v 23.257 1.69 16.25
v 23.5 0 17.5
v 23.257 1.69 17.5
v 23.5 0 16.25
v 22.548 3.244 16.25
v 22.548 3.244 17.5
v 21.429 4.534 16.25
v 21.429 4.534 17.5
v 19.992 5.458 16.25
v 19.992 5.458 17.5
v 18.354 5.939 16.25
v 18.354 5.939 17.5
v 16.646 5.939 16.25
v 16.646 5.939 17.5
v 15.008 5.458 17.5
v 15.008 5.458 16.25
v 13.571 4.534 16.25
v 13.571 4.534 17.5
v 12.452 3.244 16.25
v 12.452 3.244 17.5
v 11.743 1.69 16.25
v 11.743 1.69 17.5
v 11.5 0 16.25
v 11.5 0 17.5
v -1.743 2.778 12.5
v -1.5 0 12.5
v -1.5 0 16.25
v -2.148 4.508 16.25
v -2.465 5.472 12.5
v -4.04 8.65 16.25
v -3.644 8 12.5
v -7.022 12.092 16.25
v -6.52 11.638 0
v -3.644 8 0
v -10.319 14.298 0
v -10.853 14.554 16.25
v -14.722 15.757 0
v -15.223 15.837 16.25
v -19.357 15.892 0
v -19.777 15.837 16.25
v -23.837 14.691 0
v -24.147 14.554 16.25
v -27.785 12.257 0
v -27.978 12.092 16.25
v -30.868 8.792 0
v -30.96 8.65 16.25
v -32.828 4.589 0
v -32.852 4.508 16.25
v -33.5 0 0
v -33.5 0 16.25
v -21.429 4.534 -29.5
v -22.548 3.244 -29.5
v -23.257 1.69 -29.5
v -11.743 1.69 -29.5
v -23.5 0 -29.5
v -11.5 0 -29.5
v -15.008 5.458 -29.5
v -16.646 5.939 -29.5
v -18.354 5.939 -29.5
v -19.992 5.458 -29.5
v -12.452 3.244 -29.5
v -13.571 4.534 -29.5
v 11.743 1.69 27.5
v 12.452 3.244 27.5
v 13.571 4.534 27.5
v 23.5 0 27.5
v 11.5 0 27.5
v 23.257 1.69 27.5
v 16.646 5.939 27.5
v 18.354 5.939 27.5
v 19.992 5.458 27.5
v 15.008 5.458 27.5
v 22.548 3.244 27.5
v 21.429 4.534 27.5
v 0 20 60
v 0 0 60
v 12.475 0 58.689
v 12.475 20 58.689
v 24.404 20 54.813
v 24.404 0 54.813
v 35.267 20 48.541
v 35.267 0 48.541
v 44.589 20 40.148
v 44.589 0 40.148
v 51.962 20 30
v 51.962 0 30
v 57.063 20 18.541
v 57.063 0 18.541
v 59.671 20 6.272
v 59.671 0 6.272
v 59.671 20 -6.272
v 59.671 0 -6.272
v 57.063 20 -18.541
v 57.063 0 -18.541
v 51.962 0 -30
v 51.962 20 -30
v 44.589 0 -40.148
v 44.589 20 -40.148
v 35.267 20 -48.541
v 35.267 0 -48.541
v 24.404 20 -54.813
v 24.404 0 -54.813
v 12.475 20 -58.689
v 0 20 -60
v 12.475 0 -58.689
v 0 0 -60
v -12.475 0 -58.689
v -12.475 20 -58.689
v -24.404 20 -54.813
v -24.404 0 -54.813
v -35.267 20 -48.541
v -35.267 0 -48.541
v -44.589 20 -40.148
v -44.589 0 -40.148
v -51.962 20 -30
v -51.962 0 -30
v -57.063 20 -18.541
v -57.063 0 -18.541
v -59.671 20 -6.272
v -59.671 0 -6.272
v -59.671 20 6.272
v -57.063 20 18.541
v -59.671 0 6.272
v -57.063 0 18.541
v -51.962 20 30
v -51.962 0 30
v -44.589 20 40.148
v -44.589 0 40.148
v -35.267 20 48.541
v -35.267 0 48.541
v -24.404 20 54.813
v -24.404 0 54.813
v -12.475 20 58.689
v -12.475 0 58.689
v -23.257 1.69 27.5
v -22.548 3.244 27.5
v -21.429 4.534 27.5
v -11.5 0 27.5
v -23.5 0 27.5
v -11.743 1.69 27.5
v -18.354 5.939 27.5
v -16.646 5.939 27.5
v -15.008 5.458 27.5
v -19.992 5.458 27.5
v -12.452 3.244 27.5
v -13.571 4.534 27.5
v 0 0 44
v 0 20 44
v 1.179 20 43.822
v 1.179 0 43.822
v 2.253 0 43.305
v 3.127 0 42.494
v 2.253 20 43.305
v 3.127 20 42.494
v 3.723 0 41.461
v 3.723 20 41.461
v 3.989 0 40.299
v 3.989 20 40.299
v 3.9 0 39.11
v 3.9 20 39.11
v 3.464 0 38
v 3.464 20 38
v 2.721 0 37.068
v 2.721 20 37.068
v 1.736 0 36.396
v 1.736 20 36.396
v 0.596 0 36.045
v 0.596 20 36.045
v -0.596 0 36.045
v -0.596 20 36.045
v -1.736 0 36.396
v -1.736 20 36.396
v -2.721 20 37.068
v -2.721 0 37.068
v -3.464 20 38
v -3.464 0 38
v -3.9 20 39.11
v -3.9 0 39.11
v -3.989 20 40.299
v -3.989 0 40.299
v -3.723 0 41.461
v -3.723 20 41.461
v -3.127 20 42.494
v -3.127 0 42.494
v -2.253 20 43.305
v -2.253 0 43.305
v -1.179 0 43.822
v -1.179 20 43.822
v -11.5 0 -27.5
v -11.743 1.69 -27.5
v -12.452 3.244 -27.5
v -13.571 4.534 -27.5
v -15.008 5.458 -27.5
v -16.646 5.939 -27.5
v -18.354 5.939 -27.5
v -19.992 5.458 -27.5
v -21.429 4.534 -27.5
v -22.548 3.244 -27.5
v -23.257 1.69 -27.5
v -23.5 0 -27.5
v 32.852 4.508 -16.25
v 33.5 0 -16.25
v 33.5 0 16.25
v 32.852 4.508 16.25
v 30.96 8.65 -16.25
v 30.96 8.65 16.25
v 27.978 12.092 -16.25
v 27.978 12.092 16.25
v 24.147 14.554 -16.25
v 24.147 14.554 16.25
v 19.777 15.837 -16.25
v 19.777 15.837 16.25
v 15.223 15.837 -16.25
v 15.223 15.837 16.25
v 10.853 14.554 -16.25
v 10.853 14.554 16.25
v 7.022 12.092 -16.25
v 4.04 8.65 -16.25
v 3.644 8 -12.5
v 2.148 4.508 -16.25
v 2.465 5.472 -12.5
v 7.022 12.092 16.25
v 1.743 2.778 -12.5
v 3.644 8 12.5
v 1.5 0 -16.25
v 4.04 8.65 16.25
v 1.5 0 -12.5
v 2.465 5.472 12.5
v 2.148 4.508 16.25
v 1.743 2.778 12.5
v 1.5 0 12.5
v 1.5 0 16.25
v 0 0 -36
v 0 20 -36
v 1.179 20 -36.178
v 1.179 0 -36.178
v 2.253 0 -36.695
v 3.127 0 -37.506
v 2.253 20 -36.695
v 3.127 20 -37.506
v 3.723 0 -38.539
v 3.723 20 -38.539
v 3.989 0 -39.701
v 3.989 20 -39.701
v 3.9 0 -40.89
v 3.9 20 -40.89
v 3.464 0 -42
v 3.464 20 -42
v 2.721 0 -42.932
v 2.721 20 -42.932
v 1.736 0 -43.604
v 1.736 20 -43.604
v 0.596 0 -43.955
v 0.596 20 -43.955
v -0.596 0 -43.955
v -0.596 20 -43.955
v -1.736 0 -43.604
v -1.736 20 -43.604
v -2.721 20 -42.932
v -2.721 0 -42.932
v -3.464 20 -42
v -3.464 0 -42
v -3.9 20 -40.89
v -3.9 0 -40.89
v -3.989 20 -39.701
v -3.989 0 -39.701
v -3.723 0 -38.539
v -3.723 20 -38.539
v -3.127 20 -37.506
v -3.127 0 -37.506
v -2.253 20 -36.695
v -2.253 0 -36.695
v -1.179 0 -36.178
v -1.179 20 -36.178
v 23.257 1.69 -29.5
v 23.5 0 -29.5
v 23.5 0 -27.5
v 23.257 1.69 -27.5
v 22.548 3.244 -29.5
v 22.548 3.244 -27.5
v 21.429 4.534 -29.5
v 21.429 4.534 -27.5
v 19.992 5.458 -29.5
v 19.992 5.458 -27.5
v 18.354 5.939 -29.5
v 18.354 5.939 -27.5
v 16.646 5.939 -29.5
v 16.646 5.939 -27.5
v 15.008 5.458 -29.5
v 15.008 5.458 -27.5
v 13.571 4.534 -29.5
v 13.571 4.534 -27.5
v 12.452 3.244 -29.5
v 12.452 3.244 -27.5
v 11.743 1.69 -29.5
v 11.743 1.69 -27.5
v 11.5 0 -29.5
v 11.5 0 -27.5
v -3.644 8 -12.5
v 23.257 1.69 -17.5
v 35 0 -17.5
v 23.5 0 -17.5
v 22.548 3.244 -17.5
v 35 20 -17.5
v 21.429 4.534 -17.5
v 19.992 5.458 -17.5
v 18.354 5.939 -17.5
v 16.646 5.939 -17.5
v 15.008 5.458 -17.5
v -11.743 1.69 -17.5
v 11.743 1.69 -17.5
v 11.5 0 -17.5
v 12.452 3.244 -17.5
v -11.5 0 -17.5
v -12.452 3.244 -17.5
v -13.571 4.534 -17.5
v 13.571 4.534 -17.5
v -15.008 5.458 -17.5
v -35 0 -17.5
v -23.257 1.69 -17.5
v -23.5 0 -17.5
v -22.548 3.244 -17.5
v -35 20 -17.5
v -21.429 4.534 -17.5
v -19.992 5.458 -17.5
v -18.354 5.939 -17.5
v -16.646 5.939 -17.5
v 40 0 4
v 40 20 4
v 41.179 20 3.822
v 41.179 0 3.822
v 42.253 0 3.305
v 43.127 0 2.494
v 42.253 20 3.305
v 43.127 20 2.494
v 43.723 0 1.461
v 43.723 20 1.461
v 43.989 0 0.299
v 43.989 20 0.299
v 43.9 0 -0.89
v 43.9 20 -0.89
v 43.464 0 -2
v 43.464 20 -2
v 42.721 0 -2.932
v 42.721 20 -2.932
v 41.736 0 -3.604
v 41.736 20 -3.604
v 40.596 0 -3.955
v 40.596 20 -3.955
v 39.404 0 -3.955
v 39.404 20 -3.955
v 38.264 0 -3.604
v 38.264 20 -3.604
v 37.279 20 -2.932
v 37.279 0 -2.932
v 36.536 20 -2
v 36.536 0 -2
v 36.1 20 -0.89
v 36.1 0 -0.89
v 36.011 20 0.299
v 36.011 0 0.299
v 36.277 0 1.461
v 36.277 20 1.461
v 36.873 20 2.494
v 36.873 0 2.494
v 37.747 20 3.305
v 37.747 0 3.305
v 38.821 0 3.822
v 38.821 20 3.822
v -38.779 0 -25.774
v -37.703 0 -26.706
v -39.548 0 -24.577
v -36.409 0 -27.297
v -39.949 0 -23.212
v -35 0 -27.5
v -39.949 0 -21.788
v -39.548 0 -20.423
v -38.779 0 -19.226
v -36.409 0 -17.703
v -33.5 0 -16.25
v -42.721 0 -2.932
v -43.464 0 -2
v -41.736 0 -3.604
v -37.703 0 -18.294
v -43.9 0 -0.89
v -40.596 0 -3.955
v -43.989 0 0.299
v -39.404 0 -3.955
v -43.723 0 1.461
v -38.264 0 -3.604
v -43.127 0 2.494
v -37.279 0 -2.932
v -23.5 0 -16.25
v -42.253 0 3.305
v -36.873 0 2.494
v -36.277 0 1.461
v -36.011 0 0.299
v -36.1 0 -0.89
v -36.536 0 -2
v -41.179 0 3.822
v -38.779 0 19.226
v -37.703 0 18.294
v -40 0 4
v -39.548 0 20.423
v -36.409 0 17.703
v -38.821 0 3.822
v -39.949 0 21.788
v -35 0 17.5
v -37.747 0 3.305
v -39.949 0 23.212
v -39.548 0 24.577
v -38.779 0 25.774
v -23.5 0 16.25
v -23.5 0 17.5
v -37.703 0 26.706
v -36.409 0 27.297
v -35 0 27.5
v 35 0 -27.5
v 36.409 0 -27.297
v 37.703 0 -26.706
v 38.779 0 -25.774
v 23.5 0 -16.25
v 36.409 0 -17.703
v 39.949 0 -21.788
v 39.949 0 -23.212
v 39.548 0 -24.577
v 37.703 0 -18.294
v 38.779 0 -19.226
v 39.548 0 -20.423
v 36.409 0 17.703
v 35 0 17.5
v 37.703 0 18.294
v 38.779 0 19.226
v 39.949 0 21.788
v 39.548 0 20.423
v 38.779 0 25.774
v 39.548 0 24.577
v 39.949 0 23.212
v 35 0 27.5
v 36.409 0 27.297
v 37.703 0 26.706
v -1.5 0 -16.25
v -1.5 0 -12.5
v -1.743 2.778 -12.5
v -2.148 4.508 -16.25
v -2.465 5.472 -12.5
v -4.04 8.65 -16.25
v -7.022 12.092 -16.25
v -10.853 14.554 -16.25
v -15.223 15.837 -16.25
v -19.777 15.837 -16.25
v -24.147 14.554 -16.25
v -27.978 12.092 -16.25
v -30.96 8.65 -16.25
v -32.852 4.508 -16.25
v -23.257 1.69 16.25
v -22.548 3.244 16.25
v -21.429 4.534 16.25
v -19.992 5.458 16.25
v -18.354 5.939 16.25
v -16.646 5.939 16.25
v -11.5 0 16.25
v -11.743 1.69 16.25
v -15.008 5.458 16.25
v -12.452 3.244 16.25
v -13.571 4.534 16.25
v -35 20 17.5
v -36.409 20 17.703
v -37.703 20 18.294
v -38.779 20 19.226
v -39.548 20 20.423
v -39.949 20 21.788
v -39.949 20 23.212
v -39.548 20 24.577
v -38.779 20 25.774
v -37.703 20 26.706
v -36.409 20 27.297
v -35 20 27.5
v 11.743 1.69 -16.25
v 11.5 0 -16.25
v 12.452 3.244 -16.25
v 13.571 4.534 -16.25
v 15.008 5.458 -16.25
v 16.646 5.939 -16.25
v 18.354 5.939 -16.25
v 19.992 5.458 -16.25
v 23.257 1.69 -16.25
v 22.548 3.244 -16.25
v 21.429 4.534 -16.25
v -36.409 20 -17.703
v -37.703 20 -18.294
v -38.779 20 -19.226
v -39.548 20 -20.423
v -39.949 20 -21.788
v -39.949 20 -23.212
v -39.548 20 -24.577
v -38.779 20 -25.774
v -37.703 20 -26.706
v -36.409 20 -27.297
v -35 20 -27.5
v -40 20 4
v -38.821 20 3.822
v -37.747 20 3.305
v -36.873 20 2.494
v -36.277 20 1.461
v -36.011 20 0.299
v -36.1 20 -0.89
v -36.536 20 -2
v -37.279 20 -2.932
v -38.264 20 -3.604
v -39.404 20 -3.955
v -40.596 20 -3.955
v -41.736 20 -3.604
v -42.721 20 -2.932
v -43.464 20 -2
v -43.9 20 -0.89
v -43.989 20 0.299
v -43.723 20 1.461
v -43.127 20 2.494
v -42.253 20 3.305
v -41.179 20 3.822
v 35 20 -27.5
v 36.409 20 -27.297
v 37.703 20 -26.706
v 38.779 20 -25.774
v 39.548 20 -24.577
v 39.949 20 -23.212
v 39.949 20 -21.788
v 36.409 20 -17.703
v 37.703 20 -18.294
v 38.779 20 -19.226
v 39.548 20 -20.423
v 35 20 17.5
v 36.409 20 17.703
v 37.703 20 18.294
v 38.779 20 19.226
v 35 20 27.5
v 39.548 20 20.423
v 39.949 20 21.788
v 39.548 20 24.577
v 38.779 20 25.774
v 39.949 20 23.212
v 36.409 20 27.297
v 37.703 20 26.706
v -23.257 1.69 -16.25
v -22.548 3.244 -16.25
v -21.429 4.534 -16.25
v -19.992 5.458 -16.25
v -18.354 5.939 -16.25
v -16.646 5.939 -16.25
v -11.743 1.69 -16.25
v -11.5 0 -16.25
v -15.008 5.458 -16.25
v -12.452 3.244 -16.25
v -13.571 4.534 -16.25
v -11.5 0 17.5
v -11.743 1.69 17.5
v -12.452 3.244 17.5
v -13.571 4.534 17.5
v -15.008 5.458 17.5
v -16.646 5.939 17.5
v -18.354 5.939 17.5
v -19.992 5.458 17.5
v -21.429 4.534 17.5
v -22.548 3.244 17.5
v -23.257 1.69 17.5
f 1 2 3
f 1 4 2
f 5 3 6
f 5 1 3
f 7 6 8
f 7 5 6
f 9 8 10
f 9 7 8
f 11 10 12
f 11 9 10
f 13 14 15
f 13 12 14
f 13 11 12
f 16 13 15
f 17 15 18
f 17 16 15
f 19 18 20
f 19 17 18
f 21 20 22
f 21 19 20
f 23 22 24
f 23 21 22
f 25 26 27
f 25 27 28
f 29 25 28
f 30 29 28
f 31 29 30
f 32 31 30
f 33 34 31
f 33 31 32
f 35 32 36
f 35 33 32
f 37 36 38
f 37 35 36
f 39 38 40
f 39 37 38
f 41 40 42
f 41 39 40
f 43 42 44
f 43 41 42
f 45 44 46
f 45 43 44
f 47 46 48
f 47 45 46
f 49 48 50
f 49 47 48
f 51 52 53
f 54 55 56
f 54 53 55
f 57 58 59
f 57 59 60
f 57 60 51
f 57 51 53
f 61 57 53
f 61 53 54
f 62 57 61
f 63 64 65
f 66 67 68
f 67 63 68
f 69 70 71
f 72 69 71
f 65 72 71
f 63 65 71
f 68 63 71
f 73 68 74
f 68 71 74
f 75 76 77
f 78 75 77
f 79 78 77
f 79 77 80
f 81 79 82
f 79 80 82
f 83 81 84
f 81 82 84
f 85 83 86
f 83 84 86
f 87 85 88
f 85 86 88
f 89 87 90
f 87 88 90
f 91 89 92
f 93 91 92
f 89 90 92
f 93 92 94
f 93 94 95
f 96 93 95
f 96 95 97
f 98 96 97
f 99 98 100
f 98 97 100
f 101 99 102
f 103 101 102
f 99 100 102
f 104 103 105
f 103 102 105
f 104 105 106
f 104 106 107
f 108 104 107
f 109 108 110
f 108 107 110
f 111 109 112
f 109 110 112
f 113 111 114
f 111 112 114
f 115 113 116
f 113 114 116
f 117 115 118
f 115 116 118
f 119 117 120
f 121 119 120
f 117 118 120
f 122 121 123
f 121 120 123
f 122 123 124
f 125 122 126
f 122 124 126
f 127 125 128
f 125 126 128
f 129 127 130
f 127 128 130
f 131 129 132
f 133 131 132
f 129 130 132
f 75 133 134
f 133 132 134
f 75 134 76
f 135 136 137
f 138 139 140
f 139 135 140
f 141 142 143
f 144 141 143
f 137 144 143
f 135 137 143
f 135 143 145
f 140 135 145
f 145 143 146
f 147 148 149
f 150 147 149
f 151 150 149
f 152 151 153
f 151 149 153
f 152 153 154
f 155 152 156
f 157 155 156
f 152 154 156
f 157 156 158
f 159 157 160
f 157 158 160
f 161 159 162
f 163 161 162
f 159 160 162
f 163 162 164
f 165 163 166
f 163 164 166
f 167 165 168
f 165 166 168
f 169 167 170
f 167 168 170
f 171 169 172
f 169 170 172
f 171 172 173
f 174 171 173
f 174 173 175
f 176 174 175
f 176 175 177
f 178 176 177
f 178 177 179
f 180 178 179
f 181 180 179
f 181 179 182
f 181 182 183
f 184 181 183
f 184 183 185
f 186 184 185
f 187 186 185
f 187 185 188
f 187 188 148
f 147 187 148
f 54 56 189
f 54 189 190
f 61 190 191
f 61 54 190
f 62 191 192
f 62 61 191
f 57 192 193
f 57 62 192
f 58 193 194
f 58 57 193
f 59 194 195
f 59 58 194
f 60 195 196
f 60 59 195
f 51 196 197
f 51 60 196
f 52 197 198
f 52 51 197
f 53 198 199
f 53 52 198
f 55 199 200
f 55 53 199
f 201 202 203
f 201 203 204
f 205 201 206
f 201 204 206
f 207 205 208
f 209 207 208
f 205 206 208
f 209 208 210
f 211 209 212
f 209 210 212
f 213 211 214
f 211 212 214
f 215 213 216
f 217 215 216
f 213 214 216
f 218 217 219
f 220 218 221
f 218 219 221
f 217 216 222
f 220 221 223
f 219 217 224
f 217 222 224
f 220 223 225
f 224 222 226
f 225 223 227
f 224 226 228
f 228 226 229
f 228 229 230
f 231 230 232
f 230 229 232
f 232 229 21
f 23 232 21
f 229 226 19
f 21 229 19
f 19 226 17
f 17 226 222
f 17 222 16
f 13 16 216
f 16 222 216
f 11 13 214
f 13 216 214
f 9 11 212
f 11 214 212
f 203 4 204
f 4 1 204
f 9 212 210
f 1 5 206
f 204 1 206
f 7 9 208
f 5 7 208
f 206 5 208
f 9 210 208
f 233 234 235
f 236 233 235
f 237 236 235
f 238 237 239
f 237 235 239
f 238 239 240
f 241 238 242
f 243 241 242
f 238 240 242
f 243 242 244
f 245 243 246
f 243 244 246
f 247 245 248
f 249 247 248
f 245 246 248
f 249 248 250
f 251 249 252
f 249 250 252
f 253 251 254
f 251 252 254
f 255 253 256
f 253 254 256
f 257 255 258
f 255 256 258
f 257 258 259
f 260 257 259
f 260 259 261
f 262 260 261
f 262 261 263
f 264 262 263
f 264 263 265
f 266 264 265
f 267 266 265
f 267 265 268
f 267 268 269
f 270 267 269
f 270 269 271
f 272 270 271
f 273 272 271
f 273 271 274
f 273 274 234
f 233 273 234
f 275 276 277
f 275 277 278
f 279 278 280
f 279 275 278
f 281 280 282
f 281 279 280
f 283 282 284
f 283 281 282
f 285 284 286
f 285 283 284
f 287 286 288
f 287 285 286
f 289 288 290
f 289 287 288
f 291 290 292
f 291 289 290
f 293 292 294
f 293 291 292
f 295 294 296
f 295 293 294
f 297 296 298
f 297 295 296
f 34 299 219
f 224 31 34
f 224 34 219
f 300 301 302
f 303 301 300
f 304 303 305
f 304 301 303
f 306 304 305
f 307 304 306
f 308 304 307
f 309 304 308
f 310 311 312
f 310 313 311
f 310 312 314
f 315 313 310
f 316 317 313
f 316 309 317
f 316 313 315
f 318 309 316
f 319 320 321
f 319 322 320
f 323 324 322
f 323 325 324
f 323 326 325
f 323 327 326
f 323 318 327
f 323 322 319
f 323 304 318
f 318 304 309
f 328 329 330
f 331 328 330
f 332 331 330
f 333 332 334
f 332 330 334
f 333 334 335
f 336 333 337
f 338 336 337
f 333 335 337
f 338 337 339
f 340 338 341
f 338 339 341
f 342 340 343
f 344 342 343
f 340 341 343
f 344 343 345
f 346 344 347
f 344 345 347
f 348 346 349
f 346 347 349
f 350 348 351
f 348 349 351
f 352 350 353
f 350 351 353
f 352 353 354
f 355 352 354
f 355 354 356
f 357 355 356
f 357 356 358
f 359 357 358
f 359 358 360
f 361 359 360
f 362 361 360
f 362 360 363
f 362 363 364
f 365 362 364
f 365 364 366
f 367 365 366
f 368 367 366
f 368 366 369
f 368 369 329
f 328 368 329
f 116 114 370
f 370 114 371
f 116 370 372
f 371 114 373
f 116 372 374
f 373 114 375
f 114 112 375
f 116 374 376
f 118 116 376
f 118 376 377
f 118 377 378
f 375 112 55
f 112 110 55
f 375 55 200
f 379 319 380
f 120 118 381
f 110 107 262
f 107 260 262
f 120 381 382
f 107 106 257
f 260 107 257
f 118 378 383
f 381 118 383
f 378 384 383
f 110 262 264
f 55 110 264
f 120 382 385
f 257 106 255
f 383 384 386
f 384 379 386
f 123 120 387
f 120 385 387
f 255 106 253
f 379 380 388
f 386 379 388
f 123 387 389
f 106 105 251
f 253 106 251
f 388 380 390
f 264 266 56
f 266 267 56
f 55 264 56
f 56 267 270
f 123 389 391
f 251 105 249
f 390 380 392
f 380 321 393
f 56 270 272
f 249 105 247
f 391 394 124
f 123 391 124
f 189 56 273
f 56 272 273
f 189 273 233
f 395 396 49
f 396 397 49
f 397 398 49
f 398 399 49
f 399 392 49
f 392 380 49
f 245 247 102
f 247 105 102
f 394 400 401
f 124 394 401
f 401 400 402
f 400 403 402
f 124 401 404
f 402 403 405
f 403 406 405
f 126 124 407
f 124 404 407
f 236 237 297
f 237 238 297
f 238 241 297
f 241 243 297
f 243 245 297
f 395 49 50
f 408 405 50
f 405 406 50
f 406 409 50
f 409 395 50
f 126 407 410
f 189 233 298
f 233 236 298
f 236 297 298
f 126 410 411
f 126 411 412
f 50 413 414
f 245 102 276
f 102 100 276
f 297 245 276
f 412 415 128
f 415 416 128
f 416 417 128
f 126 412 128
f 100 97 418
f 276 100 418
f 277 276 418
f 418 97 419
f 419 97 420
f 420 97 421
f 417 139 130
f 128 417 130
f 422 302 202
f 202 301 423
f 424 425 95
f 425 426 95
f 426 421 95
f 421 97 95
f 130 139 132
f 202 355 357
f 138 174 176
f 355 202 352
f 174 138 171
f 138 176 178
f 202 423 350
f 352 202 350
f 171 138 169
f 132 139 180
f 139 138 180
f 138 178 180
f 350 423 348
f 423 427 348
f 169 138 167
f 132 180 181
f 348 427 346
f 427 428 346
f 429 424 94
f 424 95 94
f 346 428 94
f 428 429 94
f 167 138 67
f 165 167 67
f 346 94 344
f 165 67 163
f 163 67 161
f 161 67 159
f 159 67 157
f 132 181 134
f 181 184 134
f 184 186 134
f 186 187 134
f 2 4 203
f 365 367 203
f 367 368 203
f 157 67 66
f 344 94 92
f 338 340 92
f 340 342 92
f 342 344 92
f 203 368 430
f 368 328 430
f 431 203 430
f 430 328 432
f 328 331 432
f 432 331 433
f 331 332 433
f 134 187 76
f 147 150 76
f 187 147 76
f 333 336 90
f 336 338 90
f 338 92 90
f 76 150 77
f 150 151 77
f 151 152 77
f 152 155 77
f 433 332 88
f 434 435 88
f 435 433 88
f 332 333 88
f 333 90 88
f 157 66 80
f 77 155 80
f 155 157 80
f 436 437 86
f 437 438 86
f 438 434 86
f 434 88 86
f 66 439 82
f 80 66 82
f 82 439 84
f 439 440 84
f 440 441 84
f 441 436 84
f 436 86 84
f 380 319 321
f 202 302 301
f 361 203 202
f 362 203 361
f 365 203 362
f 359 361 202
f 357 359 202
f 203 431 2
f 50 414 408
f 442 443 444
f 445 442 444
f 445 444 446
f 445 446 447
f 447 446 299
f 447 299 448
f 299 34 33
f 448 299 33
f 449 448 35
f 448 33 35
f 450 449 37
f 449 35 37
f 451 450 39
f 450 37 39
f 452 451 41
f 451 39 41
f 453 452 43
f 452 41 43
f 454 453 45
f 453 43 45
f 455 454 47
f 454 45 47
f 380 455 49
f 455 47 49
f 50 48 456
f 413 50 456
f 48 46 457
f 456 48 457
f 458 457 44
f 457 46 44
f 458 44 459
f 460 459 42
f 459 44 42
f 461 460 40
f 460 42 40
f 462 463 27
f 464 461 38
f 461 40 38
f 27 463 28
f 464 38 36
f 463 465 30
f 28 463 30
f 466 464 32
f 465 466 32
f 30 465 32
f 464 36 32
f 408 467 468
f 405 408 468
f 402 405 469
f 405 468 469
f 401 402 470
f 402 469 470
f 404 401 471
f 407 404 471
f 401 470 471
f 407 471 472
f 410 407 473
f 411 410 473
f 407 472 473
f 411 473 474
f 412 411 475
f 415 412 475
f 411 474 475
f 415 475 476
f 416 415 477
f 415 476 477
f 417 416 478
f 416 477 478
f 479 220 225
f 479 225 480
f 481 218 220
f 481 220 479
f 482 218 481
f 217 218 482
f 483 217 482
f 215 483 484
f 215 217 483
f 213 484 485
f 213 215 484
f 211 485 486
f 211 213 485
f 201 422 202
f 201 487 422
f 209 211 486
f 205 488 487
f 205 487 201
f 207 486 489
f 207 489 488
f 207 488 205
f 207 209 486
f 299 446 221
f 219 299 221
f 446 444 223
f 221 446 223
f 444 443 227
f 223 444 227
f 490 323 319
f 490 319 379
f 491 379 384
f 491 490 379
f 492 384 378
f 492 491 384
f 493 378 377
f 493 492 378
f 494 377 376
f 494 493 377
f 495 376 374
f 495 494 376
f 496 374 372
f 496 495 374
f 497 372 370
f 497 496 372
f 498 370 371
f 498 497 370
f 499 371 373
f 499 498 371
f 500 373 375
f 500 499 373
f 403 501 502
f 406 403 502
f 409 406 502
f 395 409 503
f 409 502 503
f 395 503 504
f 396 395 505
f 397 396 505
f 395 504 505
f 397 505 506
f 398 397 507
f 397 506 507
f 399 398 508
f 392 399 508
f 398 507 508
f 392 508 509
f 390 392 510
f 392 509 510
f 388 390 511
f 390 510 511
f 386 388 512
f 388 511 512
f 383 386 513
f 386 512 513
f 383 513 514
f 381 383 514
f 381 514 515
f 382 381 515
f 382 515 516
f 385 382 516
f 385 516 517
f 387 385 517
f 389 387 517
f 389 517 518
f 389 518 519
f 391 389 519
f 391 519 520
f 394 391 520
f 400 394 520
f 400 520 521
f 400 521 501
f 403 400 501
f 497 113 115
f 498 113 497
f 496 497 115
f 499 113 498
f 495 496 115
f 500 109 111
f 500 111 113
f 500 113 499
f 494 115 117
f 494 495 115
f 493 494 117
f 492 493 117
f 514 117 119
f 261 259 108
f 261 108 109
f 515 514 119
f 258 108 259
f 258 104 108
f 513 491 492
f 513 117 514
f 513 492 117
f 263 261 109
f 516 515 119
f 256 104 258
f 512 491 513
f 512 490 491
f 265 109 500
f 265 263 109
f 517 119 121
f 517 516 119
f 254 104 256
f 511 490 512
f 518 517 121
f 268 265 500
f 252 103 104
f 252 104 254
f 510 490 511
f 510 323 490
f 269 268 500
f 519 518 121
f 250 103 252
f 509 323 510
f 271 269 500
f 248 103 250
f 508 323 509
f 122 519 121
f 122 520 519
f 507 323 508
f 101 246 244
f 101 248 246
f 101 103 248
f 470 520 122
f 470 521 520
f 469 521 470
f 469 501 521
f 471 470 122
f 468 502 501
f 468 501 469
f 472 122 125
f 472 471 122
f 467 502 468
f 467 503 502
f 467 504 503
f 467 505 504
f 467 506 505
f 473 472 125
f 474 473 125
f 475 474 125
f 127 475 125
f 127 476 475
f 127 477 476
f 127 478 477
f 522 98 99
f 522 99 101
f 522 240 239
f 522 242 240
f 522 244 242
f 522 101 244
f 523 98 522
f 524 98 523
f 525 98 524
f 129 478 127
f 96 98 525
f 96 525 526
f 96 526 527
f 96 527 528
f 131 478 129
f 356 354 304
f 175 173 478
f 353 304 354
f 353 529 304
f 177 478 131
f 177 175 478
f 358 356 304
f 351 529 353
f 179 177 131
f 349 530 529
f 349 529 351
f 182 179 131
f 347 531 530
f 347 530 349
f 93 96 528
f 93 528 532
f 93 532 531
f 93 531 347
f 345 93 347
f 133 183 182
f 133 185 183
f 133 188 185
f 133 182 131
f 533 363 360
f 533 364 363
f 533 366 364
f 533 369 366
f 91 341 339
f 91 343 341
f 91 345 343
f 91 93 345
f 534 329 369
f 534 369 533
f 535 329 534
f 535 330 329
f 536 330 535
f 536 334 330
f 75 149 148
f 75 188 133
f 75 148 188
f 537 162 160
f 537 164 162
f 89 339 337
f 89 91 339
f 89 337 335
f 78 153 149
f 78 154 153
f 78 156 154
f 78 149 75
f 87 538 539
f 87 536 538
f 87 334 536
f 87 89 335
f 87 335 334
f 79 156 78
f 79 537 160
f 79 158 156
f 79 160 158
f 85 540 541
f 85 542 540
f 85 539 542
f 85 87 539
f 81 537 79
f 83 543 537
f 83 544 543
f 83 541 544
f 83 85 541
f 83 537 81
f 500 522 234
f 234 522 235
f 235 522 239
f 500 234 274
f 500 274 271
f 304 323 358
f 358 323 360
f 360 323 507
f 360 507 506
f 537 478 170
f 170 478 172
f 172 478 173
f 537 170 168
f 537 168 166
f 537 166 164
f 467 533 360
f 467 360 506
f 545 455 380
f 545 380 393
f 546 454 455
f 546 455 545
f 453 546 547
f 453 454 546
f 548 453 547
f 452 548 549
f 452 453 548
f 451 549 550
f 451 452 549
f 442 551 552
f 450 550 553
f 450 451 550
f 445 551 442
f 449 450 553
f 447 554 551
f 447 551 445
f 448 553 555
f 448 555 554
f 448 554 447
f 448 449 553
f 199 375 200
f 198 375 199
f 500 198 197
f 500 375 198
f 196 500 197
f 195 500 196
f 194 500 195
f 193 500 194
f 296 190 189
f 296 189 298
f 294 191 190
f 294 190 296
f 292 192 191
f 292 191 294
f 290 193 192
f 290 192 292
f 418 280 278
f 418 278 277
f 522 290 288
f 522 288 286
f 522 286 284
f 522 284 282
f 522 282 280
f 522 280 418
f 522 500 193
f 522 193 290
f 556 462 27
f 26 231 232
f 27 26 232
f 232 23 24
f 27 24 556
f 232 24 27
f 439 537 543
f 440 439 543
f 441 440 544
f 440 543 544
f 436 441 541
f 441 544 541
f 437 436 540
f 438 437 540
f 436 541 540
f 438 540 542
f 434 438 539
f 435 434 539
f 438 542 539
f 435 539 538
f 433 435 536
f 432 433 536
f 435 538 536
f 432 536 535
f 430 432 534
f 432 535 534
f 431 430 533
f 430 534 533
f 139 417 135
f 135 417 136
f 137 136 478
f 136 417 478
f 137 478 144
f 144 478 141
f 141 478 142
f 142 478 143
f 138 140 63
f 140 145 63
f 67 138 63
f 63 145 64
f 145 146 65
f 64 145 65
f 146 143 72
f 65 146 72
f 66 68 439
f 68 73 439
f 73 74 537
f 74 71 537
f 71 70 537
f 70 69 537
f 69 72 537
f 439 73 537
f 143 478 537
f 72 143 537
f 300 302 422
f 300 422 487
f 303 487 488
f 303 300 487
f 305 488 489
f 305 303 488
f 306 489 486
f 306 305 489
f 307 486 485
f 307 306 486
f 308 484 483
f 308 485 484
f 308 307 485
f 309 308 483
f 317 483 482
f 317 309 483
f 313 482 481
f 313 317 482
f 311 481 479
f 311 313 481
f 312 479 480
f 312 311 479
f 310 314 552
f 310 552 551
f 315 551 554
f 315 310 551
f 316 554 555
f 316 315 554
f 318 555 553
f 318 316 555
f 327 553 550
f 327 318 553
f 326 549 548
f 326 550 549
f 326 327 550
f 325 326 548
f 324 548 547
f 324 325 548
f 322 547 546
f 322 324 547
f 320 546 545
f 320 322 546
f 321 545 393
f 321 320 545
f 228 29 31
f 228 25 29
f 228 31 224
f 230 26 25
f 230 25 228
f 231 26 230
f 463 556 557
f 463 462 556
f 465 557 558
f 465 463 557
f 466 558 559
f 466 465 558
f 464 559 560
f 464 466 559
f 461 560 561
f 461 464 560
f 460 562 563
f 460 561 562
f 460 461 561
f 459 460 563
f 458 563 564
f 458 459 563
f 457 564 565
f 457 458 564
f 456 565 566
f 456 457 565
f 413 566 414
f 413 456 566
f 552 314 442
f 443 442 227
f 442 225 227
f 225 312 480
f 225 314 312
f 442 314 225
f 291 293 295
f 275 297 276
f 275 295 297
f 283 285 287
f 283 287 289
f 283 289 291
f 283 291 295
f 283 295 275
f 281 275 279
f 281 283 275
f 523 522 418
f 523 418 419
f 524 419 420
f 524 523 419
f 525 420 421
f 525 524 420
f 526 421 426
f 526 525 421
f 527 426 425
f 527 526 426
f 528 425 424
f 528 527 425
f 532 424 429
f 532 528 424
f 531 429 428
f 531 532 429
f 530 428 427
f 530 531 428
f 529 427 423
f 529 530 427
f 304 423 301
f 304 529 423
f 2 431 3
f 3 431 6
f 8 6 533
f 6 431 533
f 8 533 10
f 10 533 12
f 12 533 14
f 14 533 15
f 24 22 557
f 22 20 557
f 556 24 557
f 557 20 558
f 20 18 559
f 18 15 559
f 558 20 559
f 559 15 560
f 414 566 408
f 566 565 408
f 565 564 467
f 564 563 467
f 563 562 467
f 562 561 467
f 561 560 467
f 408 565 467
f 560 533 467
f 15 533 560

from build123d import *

# Parameters (mm, degrees)
SKETCH2_R               = 60
BOSS_EXTRUDE1_DEPTH     = 20
SKETCH3_W               = 60
SKETCH3_H               = 25
CUT_EXTRUDE1_DEPTH      = 8
CUT_EXTRUDE2_DEPTH      = 40
CUT_EXTRUDE2_DEPTH_BACK = 17
SKETCH4_R               = 6
SKETCH5_R               = 16
CUT_EXTRUDE3_DEPTH      = 16.25
SKETCH6_R               = 4
CUT_EXTRUDE4_DEPTH      = 88.177978871
CUT_EXTRUDE5_DEPTH      = 88.177978871


with BuildPart() as part:
    # Sketch2 → Boss-Extrude1 (new body)
    with BuildSketch(Plane(origin=(0, 0, 0), x_dir=(1, 0, 0), z_dir=(0, 1, 0))):
        with Locations(Location((0, 0, 0), (0, 0, 270))):
            Circle(SKETCH2_R)
    extrude(amount=BOSS_EXTRUDE1_DEPTH)

    # Sketch3 → Cut-Extrude1 (cut)
    with BuildSketch(Plane.XZ):
        Rectangle(SKETCH3_W, SKETCH3_H)
    extrude(amount=-CUT_EXTRUDE1_DEPTH, mode=Mode.SUBTRACT)

    # Sketch4 → Cut-Extrude2 (cut, two sides: drawn at the far end of the back side and taken through both)
    with BuildSketch(Plane.XY.offset(-12.5).offset(-CUT_EXTRUDE2_DEPTH_BACK)):
        with Locations((-17.5, 0)):
            Circle(SKETCH4_R)
        with Locations((17.5, 0)):
            Circle(SKETCH4_R)
    extrude(amount=CUT_EXTRUDE2_DEPTH + CUT_EXTRUDE2_DEPTH_BACK, mode=Mode.SUBTRACT)

    # Sketch5 → Cut-Extrude3 (cut, symmetric)
    with BuildSketch(Plane.XY):
        with Locations((-17.5, 0)):
            Circle(SKETCH5_R)
        with Locations((17.5, 0)):
            Circle(SKETCH5_R)
    extrude(amount=CUT_EXTRUDE3_DEPTH, both=True, mode=Mode.SUBTRACT)

    # Sketch6 → Cut-Extrude4 (cut, through all)
    with BuildSketch(Plane(origin=(0, 20, 0), x_dir=(1, 0, 0), z_dir=(0, 1, 0))):
        with Locations(Location((0, 40, 0), (0, 0, 270))):
            Circle(SKETCH6_R)
        with Locations(Location((40, 0, 0), (0, 0, 270))):
            Circle(SKETCH6_R)
        with Locations(Location((0, -40, 0), (0, 0, 270))):
            Circle(SKETCH6_R)
        with Locations(Location((-40, 0, 0), (0, 0, 270))):
            Circle(SKETCH6_R)
    extrude(amount=-CUT_EXTRUDE4_DEPTH, mode=Mode.SUBTRACT)

    # Sketch7 → Cut-Extrude5 (cut, through all)
    with BuildSketch(Plane(origin=(0, 20, 0), x_dir=(1, 0, 0), z_dir=(0, 1, 0))):
        with BuildLine():
            Line((-35, 27.5), (35, 27.5))
            ThreePointArc((35, 27.5), (40, 22.5), (35, 17.5))
            Line((35, 17.5), (-35, 17.5))
            ThreePointArc((-35, 17.5), (-40, 22.5), (-35, 27.5))
        make_face()
        with BuildLine():
            Line((-35, -27.5), (35, -27.5))
            ThreePointArc((35, -27.5), (40, -22.5), (35, -17.5))
            Line((35, -17.5), (-35, -17.5))
            ThreePointArc((-35, -17.5), (-40, -22.5), (-35, -27.5))
        make_face()
    extrude(amount=-CUT_EXTRUDE5_DEPTH, mode=Mode.SUBTRACT)


solid = part.part
